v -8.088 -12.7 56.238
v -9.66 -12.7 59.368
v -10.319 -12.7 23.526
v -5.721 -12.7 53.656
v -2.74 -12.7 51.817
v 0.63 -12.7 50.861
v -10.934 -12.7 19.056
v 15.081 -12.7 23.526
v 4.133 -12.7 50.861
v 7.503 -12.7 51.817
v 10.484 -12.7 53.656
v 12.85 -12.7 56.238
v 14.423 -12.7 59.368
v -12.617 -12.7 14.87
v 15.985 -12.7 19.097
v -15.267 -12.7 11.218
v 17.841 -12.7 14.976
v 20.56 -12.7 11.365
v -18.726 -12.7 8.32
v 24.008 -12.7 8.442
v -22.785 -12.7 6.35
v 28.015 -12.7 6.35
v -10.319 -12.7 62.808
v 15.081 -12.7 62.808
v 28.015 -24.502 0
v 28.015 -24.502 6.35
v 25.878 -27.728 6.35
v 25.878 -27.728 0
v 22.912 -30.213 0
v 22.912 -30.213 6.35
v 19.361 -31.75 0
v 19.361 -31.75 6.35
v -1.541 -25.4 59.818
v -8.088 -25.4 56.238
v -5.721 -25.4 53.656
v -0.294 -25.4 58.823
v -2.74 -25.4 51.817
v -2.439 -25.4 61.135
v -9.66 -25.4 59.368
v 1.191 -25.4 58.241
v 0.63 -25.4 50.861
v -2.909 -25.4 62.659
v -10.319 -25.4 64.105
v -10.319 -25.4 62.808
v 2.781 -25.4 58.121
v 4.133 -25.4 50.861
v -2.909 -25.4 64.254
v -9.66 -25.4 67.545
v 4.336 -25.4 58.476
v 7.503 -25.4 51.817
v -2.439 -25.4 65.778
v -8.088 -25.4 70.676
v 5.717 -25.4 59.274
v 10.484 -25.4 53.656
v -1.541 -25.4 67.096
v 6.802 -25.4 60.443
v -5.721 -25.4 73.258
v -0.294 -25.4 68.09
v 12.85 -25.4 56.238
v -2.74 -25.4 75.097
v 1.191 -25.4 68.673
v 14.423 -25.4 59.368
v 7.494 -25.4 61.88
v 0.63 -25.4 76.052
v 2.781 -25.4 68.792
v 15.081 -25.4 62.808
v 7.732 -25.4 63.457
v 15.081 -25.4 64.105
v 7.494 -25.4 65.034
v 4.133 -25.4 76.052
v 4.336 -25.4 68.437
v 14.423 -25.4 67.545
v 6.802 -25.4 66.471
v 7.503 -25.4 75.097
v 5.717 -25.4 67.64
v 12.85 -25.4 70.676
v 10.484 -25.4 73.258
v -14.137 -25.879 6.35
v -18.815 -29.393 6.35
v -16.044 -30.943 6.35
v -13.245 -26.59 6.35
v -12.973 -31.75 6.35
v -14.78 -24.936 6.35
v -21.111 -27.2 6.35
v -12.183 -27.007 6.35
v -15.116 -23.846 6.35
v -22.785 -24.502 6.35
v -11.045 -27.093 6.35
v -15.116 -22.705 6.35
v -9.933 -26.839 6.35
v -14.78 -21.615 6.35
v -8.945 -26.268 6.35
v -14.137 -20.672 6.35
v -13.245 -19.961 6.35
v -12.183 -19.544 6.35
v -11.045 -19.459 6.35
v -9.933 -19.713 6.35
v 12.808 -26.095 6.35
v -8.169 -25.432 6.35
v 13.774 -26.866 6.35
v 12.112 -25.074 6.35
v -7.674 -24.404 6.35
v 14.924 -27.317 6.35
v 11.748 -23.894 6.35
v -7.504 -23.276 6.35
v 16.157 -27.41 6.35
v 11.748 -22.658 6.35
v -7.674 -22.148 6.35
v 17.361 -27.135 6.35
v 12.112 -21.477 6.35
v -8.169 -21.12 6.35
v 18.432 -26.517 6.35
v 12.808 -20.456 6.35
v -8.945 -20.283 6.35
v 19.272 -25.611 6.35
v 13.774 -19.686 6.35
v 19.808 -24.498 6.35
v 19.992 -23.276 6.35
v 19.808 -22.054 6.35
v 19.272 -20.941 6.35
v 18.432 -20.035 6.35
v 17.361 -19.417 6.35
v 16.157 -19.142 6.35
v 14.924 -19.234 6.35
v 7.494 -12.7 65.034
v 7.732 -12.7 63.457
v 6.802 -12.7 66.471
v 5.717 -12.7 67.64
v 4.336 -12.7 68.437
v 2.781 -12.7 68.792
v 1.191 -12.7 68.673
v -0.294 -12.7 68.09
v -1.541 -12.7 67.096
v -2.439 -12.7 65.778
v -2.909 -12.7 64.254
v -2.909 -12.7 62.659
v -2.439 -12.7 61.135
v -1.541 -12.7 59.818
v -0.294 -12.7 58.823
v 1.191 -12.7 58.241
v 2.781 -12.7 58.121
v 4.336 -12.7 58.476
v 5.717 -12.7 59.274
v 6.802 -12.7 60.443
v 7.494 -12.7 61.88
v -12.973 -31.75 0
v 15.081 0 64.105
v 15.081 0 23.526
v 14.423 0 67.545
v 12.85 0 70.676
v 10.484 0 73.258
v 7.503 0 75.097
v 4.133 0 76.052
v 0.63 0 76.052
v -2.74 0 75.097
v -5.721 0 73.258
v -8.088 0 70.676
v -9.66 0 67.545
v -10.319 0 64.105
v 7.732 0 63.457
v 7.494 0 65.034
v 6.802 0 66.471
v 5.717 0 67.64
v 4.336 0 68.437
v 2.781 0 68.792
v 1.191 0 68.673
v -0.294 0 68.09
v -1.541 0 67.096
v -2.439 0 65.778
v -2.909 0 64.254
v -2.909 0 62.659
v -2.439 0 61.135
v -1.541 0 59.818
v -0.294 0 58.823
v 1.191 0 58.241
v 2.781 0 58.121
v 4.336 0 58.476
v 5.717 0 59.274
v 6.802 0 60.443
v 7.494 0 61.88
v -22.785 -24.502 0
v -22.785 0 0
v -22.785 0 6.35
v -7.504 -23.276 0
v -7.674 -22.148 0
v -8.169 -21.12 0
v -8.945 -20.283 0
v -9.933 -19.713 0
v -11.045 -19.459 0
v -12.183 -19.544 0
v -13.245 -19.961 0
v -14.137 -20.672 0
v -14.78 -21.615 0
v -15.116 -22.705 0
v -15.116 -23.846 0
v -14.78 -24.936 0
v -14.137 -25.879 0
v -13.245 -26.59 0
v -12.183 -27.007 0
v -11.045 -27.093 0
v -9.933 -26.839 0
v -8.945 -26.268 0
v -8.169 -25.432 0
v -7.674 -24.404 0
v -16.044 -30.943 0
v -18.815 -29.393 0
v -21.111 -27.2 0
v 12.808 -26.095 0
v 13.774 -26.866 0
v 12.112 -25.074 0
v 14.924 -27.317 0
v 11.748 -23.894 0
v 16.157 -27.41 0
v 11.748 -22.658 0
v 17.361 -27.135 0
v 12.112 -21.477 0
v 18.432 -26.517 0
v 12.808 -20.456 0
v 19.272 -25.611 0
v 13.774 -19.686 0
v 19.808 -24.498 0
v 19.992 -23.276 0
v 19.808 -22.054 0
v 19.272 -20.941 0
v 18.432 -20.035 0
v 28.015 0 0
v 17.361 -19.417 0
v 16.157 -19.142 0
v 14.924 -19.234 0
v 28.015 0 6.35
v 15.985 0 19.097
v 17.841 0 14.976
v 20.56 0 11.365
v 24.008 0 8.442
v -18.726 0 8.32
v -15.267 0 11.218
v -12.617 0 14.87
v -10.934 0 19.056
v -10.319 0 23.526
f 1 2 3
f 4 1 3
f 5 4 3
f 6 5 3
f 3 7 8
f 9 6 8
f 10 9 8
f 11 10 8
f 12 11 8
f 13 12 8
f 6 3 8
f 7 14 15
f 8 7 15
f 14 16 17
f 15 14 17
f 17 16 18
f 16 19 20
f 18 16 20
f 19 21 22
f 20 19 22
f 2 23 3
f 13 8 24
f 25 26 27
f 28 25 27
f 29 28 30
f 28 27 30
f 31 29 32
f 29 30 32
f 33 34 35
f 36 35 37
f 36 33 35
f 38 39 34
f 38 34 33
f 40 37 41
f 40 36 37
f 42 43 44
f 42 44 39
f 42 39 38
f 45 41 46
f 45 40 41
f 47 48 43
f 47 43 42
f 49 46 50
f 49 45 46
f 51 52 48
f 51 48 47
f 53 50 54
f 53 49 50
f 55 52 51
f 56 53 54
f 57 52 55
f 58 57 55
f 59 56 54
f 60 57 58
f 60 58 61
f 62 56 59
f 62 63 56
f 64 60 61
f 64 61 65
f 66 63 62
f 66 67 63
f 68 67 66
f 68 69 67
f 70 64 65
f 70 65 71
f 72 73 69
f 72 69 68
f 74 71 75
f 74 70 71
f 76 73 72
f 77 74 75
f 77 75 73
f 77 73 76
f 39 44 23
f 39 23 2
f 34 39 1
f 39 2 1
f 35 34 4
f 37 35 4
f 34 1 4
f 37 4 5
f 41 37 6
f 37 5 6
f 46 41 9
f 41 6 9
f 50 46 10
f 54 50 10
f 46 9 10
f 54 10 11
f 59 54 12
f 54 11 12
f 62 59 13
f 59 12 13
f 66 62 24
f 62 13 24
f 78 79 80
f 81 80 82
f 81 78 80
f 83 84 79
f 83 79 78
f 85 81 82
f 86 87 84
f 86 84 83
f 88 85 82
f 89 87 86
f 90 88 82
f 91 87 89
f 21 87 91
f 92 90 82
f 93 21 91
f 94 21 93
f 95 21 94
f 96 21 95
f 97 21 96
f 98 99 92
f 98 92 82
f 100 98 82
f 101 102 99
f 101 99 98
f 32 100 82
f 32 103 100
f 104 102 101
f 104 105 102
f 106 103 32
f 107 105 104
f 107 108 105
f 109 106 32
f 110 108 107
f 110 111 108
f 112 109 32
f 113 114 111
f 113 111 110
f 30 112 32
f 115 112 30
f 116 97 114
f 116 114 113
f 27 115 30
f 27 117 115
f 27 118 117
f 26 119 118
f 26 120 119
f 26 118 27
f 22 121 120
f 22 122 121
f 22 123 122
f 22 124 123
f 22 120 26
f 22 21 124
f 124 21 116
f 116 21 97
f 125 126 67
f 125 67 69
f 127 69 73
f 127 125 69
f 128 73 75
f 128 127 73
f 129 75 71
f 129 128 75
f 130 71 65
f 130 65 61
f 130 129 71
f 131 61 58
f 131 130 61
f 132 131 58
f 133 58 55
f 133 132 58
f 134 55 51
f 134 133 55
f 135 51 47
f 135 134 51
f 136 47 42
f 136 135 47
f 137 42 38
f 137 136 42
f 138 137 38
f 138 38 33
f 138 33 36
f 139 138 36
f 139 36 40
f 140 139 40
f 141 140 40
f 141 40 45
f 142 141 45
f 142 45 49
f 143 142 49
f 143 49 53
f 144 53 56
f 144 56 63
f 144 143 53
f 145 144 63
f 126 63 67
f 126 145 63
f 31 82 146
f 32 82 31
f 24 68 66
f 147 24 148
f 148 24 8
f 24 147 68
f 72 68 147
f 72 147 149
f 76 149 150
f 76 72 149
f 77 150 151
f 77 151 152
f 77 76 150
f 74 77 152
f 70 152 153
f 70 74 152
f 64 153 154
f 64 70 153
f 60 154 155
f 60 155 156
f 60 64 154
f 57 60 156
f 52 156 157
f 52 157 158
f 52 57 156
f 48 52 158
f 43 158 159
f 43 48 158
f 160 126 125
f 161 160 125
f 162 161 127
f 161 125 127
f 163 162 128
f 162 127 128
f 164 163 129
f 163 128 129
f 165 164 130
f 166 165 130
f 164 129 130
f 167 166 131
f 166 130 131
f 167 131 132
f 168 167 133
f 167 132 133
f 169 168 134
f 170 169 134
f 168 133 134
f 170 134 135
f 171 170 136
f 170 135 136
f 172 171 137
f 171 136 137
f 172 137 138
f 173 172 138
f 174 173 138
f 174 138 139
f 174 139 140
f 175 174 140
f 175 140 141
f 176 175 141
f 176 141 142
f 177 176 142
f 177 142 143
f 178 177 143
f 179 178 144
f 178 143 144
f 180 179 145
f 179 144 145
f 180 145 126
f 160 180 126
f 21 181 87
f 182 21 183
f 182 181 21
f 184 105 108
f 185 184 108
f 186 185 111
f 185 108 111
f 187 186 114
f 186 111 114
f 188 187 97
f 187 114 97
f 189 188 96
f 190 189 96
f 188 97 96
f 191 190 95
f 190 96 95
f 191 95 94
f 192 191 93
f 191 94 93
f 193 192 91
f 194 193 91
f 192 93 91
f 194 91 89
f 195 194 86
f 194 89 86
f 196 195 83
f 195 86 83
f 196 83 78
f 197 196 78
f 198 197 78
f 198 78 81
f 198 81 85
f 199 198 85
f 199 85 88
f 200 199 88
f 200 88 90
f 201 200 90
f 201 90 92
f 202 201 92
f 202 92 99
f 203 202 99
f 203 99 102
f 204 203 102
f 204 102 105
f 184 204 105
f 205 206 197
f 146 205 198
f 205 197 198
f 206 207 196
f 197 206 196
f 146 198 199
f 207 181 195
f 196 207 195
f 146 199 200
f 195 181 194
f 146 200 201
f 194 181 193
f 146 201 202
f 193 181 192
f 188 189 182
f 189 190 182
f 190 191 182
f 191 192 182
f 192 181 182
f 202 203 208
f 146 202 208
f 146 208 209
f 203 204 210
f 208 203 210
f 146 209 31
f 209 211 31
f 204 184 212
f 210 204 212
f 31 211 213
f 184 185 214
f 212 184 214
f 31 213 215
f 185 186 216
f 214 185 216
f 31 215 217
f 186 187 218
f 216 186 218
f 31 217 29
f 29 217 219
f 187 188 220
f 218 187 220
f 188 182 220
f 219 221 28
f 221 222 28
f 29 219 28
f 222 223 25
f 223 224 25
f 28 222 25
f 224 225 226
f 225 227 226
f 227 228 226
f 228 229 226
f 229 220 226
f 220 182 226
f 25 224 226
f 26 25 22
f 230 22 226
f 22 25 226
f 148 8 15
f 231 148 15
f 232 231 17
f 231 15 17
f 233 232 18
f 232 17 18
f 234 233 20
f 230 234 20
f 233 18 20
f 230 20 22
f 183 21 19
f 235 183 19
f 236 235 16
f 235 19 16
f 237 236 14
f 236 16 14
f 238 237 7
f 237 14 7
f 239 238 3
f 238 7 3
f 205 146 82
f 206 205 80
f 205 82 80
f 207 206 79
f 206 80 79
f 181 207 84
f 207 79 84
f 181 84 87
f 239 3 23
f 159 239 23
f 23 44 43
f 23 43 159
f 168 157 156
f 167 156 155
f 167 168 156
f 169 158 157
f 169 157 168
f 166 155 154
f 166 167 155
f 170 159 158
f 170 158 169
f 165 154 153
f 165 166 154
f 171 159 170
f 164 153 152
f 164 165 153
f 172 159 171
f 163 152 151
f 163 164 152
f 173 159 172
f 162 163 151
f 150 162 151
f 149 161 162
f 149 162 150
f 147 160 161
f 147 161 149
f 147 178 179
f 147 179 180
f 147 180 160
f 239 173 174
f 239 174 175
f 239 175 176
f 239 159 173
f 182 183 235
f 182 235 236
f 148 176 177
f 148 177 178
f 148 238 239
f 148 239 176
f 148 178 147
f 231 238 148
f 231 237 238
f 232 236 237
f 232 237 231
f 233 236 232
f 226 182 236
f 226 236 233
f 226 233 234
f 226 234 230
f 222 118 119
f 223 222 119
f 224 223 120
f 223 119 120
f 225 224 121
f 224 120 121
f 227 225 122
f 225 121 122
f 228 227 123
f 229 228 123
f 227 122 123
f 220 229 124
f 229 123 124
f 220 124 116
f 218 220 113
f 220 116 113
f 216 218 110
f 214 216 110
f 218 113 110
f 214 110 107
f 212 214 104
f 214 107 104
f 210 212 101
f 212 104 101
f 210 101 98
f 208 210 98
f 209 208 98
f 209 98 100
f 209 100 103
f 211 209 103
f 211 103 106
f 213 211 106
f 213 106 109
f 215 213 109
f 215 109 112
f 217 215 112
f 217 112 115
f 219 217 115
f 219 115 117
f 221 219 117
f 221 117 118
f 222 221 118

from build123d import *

# Parameters (mm, degrees)
F0_W      = 50.8
F0_H      = 6.35
F1_DEPTH  = 31.75
F2_W      = 50.8
F2_H      = 12.7
F3_DEPTH  = 69.85
F4_R      = 4.1454227759
F4_R_2    = 3.8275327049
F5_DEPTH  = 12.7
F7_DEPTH  = 12.7
F8_R      = 5.3504269389
F9_DEPTH  = 12.7
F10_DEPTH = 12.7


with BuildPart() as f1:
    # F0 (on Front) → F1 (new body)
    with BuildSketch(Plane.XZ):
        with Locations((2.6147060619, 3.175)):
            Rectangle(F0_W, F0_H)
    extrude(amount=F1_DEPTH)

    # F2 (on face) → F3 (join)
    with BuildSketch(Plane.XY.offset(6.35)):
        with Locations((2.6147060619, -6.35)):
            Rectangle(F2_W, F2_H)
    extrude(amount=F3_DEPTH)

    # F4 (on face) → F5 (cut)
    with BuildSketch(Plane.XY.offset(6.35)):
        with Locations((15.8469081592, -23.275712505)):
            Circle(F4_R)
        with Locations((-11.3311024653, -23.275712505)):
            Circle(F4_R_2)
        with BuildLine():
            ThreePointArc((-12.9734249786, -31.75), (-18.8152455834, -29.3930620602), (-22.7852939381, -24.5021786541))
            Line((-22.7852939381, -24.5021786541), (-22.7852939381, -31.75))
            Line((-22.7852939381, -31.75), (-12.9734249786, -31.75))
        make_face()
        with BuildLine():
            ThreePointArc((28.0147060619, -24.5021786541), (24.4846674342, -29.0776682905), (19.3607117981, -31.75))
            Line((19.3607117981, -31.75), (28.0147060619, -31.75))
            Line((28.0147060619, -31.75), (28.0147060619, -24.5021786541))
        make_face()
    extrude(amount=-F5_DEPTH, mode=Mode.SUBTRACT)

    # F6 (on face) → F7 (cut)
    with BuildSketch(Plane.XZ.offset(12.7)):
        with BuildLine():
            Line((-22.7852939381, 76.2), (-22.7852939381, 6.35))
            ThreePointArc((-22.7852939381, 6.35), (-13.8298680574, 12.9622223367), (-10.3186676279, 23.5259626061))
            Line((-10.3186676279, 23.5259626061), (-10.3186676279, 76.2))
            Line((-10.3186676279, 76.2), (-22.7852939381, 76.2))
        make_face()
        with BuildLine():
            ThreePointArc((15.0813323721, 23.5259626061), (19.1005030761, 13.0950196253), (28.0147060619, 6.35))
            Line((28.0147060619, 6.35), (28.0147060619, 76.2))
            Line((28.0147060619, 76.2), (15.0813323721, 76.2))
            Line((15.0813323721, 76.2), (15.0813323721, 23.5259626061))
        make_face()
    extrude(amount=-F7_DEPTH, mode=Mode.SUBTRACT)

    # F8 (on face) → F9 (join)
    with BuildSketch(Plane.XZ.offset(12.7)):
        with BuildLine():
            Line((15.0813323721, 62.8083311773), (15.0813323721, 64.1052759432))
            ThreePointArc((15.0813323721, 64.1052759432), (2.3813323721, 76.1733485482), (-10.3186676279, 64.1052759432))
            Line((-10.3186676279, 64.1052759432), (-10.3186676279, 62.8083311773))
            ThreePointArc((-10.3186676279, 62.8083311773), (2.3813323721, 50.7402585723), (15.0813323721, 62.8083311773))
        make_face()
        with Locations((2.3813323721, 63.4568035603)):
            Circle(F8_R, mode=Mode.SUBTRACT)
    extrude(amount=F9_DEPTH)

    # F10 (cut): faces of the model
    f10_faces = [f1.faces().sort_by_distance(p)[0] for p in [
        (14.8000065201, -12.7, 70.1526379716),
        (2.3813323721, -12.7, 63.4568035603),
    ]]
    extrude(f10_faces, amount=-F10_DEPTH, mode=Mode.SUBTRACT)


solid = f1.part
